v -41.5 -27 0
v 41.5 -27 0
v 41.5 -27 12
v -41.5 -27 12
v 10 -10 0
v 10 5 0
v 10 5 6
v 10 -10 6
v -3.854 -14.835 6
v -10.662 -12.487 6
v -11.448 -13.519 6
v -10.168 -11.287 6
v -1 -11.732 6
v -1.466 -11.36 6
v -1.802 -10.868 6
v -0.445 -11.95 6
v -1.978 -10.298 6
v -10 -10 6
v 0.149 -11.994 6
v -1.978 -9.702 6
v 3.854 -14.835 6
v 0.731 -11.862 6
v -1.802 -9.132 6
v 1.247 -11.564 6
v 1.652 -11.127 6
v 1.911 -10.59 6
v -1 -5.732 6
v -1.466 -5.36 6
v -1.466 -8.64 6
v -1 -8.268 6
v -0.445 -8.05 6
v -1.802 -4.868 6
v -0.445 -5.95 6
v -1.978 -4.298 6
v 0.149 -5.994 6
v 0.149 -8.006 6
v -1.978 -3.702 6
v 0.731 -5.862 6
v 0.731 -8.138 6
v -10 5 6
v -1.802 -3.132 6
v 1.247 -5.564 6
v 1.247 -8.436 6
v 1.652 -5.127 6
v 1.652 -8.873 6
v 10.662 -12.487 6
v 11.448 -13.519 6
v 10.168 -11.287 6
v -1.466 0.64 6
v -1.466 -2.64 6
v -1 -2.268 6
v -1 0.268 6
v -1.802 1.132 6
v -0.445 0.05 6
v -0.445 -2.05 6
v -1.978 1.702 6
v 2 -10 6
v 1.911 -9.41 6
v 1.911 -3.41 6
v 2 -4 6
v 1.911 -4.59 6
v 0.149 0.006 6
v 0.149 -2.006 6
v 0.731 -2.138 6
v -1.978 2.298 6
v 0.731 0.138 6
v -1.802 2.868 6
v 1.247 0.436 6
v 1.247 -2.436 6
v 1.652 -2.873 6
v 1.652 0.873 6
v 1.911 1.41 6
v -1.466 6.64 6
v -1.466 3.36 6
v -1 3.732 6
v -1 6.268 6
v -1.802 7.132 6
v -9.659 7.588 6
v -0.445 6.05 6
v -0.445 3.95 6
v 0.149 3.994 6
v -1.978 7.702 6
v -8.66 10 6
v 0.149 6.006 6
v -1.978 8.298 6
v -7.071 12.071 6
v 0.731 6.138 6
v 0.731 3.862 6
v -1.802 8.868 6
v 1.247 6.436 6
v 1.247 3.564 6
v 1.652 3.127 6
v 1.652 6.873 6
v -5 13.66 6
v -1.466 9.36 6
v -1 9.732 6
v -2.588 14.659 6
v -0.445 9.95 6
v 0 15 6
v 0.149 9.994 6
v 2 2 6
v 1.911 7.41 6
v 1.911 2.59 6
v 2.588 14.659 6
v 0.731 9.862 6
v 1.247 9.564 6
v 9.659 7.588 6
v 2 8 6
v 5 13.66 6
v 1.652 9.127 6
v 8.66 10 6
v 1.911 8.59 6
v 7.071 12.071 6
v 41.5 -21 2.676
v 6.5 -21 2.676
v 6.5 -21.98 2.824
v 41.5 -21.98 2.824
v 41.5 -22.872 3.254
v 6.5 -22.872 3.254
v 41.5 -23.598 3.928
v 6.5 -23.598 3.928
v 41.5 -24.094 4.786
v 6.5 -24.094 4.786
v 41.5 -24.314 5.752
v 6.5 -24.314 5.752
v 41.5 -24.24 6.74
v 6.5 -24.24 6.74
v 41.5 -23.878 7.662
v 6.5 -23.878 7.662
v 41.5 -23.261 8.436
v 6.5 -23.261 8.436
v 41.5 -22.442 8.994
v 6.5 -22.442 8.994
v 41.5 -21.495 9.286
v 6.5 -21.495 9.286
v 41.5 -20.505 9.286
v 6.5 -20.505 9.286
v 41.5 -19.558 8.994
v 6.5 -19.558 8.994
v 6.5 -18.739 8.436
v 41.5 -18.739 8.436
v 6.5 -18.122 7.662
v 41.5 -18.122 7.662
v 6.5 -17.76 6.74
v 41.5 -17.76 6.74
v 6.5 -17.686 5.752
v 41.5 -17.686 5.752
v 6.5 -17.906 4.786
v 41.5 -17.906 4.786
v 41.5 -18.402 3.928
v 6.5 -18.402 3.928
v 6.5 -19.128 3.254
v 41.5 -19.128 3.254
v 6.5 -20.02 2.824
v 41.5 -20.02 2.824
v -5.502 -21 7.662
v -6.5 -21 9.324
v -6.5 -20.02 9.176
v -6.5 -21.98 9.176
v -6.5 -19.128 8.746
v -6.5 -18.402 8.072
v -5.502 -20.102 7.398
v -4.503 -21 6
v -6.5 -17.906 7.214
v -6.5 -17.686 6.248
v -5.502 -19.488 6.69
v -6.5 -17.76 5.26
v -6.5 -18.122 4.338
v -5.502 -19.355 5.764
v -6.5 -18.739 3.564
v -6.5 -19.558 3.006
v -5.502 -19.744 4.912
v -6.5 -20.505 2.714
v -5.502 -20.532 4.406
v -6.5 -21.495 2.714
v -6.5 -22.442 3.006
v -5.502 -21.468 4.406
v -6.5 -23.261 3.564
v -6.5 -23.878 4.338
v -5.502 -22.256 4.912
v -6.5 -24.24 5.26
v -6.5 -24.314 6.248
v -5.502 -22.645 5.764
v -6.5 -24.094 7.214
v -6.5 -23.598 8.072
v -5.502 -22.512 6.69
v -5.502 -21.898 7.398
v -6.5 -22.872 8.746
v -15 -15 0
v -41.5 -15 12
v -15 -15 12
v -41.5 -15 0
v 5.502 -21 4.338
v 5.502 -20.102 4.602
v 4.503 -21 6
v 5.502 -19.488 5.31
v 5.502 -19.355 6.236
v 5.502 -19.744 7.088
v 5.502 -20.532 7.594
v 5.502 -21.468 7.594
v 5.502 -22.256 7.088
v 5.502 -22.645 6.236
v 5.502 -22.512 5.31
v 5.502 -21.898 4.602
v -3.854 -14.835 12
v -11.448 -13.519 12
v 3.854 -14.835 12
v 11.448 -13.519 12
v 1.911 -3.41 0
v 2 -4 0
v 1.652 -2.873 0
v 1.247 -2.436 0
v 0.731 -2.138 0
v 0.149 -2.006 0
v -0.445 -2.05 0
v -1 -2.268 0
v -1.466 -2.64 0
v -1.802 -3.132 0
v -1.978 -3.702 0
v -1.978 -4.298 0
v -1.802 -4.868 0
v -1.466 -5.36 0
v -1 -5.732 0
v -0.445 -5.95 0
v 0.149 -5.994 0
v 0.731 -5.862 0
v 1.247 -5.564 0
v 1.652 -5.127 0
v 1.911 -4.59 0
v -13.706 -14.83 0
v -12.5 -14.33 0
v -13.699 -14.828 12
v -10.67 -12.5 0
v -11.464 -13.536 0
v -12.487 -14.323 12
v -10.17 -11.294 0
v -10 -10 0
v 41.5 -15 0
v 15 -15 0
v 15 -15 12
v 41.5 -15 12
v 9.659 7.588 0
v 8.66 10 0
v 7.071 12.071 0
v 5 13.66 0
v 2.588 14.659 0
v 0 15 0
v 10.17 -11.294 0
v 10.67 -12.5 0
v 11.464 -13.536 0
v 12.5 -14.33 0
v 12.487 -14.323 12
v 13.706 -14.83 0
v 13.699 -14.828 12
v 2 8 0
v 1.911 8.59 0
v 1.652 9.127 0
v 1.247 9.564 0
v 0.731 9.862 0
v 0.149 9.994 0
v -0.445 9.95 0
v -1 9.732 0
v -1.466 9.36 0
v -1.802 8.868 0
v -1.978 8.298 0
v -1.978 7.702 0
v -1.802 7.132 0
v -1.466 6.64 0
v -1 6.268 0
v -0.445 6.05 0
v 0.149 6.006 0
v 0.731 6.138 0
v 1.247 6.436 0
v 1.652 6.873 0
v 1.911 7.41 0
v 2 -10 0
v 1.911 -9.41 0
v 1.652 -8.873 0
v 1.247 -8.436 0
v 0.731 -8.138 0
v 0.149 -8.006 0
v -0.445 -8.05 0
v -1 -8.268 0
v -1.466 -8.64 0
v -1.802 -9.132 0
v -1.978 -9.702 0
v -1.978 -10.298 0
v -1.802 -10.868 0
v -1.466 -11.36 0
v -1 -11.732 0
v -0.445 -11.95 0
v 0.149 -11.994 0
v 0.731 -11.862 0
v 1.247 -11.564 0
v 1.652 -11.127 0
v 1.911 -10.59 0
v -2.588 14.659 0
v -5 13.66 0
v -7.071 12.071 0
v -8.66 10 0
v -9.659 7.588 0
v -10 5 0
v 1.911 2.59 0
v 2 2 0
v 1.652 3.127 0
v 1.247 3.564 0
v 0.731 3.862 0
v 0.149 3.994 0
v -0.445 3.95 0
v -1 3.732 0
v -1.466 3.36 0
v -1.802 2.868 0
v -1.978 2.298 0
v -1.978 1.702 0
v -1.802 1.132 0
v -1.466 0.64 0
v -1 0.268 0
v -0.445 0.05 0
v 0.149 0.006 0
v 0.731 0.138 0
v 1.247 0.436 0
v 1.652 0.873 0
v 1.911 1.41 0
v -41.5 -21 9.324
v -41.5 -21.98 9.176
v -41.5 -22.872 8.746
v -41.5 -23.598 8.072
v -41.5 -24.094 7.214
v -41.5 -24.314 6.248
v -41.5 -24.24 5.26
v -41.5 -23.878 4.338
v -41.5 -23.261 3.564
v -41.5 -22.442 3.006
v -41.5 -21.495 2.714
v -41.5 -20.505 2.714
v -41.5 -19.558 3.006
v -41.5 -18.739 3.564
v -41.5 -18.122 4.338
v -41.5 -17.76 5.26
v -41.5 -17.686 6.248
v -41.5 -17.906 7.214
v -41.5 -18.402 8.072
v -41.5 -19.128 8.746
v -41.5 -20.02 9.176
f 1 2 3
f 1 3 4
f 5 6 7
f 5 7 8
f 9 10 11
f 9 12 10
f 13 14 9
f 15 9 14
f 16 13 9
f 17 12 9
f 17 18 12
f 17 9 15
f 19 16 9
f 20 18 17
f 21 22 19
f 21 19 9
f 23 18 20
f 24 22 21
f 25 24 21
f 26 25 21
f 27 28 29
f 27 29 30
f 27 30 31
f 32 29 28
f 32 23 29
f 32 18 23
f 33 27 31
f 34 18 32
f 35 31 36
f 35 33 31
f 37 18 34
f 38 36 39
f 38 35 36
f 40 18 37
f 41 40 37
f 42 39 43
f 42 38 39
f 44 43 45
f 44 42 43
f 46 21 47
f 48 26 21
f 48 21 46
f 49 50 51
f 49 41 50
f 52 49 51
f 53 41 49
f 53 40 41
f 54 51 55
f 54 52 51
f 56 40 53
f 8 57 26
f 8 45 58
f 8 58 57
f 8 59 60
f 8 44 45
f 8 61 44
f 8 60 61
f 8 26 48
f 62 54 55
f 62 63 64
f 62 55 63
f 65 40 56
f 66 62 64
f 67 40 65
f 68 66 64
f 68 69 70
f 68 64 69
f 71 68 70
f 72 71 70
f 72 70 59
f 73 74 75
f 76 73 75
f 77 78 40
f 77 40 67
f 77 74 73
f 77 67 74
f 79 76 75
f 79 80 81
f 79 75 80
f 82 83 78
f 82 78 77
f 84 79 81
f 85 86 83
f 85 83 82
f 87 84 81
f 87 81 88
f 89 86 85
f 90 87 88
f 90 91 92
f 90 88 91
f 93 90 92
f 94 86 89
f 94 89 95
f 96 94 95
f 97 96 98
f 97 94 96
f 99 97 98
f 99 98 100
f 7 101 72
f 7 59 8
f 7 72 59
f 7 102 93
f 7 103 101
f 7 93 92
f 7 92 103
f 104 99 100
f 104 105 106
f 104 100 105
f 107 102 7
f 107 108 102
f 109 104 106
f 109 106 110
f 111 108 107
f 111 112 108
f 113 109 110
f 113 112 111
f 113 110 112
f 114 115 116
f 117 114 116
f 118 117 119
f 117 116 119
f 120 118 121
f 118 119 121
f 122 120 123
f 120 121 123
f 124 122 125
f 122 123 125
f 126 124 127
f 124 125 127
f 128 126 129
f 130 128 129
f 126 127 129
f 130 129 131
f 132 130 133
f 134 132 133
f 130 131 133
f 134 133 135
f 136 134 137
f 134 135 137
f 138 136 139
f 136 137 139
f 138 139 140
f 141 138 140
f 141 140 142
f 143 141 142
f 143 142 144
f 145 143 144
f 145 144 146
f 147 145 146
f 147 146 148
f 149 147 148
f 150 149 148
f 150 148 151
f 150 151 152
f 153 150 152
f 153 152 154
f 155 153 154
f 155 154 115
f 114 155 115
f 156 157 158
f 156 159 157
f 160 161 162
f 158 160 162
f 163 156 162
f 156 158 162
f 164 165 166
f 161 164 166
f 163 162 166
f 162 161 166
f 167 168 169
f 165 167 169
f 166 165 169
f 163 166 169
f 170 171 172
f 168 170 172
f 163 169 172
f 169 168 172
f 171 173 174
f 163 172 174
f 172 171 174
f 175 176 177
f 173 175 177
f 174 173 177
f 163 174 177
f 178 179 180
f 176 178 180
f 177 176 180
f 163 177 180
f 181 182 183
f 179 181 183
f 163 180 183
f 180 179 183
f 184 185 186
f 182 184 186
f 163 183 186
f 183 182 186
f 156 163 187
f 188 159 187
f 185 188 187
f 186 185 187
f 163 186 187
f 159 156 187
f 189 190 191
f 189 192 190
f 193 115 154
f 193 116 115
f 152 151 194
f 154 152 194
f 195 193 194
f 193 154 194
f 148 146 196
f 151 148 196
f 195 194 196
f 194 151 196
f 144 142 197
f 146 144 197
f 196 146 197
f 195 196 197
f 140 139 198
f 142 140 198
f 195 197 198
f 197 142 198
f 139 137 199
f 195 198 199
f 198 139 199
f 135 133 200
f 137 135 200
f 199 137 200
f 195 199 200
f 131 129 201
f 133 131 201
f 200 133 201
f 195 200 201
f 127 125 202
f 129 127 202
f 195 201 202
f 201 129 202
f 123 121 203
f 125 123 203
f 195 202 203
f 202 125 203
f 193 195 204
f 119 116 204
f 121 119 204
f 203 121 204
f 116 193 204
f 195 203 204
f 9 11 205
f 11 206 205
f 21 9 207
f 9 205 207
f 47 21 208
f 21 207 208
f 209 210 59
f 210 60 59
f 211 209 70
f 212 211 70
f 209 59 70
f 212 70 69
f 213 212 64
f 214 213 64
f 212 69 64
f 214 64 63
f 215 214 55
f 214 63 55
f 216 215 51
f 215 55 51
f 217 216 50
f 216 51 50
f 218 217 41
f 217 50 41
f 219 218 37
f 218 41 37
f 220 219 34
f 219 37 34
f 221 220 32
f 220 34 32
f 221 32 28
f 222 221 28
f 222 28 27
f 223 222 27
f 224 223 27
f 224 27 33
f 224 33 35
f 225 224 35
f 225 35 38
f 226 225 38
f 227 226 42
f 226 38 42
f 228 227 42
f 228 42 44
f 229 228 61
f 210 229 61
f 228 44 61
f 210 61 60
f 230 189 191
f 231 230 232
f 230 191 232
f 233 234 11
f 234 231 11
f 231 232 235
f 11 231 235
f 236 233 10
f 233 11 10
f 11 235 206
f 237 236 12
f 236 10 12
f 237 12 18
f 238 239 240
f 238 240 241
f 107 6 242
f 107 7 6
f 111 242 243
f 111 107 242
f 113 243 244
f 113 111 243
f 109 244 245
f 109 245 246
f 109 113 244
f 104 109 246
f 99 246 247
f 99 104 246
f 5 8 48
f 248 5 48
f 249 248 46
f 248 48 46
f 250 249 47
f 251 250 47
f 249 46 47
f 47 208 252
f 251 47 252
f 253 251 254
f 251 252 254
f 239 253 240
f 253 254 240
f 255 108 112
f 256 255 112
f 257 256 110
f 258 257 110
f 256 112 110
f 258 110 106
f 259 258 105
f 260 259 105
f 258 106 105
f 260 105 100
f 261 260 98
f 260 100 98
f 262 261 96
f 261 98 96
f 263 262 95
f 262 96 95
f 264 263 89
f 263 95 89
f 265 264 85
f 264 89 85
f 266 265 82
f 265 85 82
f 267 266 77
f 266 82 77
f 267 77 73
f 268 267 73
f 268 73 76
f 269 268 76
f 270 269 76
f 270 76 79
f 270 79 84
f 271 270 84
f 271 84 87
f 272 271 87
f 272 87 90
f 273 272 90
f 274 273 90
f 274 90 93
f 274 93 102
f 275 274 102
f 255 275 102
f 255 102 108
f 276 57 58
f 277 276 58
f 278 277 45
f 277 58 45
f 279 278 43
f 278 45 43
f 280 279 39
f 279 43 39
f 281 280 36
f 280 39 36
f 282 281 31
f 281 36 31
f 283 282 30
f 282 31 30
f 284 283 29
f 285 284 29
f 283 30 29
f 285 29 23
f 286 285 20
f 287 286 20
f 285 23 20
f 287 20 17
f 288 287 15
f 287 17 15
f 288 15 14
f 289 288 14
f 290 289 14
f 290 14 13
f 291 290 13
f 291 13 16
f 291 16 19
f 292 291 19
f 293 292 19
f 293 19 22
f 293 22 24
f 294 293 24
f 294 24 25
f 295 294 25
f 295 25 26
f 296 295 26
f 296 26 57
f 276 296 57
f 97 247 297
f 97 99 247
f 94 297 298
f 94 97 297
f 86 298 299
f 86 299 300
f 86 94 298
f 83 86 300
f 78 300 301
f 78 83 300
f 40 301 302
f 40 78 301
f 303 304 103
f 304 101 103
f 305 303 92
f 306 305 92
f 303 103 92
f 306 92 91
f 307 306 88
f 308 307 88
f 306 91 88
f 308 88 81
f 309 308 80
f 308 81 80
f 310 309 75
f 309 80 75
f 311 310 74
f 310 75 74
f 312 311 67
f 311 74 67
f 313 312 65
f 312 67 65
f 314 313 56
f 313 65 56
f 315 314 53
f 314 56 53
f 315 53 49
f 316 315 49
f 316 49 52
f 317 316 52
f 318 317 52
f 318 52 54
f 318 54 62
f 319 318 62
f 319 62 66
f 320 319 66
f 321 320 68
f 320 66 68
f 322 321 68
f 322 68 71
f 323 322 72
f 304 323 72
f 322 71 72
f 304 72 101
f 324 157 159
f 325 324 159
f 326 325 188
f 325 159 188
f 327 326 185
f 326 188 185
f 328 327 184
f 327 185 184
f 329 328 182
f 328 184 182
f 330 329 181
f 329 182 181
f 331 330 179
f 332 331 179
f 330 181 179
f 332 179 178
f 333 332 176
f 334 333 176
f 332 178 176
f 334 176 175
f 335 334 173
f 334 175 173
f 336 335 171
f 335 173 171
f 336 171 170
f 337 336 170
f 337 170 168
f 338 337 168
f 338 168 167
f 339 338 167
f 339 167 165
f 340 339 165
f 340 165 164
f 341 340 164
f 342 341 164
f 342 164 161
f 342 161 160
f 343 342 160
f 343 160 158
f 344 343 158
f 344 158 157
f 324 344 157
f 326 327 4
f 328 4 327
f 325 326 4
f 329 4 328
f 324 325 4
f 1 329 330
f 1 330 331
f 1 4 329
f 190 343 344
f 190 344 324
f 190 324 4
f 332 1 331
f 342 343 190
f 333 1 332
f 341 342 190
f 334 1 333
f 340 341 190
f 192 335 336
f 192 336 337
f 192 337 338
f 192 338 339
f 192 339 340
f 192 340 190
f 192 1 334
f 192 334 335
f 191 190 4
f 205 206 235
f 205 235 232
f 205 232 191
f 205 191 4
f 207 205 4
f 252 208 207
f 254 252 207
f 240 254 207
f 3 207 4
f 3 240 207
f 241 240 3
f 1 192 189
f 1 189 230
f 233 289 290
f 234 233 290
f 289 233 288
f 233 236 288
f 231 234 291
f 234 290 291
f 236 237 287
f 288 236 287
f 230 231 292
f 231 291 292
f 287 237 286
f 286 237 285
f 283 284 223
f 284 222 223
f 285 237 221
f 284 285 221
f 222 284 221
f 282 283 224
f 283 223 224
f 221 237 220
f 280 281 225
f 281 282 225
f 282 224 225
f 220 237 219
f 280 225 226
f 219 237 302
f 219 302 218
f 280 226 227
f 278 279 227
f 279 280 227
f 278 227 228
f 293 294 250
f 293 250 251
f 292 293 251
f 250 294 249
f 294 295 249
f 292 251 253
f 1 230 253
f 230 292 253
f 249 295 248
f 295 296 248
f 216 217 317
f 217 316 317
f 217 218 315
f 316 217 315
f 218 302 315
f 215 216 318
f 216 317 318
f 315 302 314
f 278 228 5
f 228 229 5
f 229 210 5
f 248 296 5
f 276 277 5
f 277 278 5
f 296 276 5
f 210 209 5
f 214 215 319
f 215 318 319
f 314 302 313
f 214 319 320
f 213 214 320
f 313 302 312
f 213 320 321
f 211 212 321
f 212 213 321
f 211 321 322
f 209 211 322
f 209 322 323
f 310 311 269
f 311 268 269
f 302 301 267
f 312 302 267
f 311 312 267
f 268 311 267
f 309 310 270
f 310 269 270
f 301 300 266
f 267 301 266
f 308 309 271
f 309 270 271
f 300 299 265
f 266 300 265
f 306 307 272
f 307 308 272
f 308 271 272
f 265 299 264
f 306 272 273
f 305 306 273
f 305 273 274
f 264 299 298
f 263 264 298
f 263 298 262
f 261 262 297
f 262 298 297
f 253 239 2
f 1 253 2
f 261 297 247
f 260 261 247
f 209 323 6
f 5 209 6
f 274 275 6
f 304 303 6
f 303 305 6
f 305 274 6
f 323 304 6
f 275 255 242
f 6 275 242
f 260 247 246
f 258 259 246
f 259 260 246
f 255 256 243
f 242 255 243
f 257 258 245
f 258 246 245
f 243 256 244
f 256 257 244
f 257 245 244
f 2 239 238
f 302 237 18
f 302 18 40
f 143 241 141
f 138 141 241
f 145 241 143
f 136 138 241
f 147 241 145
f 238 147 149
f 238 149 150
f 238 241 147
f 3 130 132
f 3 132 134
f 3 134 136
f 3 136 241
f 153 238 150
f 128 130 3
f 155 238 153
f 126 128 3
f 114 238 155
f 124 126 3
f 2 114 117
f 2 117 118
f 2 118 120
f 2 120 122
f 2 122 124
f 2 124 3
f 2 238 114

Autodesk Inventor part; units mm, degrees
ref_plane "YZ Plane" through (0, 0, 0) normal (1, 0, 0) x (0, 1, 0)
ref_plane "XZ Plane" through (0, 0, 0) normal (0, 1, 0) x (-1, 0, 0)
ref_plane "XY Plane" through (0, 0, 0) normal (0, 0, 1) x (1, 0, 0)
sketch "Sketch1" plane through (0, 0, 0) normal (0, 0, 1) x (1, 0, 0)
  line L0 (0, 23.4) -> (0, -35.4) projected
  line L1 (-58.1, 0) -> (58.1, 0) projected
  line L2 (-10, 15) -> (10, 15)
  line L3 (10, 15) -> (10, -15)
  line L4 (10, -15) -> (-10, -15)
  line L5 (-10, -15) -> (-10, 15)
  line L6 (-41.5, -15) -> (41.5, -15)
  line L7 (41.5, -15) -> (41.5, -27)
  line L8 (41.5, -27) -> (-41.5, -27)
  line L9 (-41.5, -27) -> (-41.5, -15)
  point P0 (0, 0)
  point P1 (10, -15)
  point P2 (-10, -15)
  dimension "d0" = 30
  dimension "d1" = 12
  dimension "d2" = 83
  dimension "d3" = 20
extrude "Extrusion1" add sketch "Sketch1" along normal blind 12
sketch "Sketch2" plane through (41.5, -27, 0) normal (1, 0, 0) x (0, 0, -1)
  line L0 (0, 12) -> (-12, 12) projected
  line L1 (-12, 0) -> (-12, 12) projected
  point P0 (0, 27)
  point P1 (-6, 6)
  dimension "d6" = 6
  dimension "d7" = 6
hole "Hole1" at (41.5, -21, 6) direction (-1, 0, 0) diameter 6.647 depth 35 tip angle 118 thread size "M8x1.25" class "6H" standard "ISO Metric profile"
sketch "Sketch3" plane through (-41.5, -27, 0) normal (-1, 0, 0) x (0, 0, 1)
  line L0 (0, 12) -> (12, 12) projected
  line L1 (0, 12) -> (0, 0) projected
  point P0 (0, 27)
  point P1 (6, 6)
  dimension "d15" = 6
  dimension "d16" = 6
hole "Hole2" at (-41.5, -21, 6) direction (1, 0, 0) diameter 6.647 depth 35 tip angle 118 thread size "M8x1.25" class "6H" standard "ISO Metric profile"
sketch "Sketch4" plane through (0, 0, 12) normal (0, 0, 1) x (1, 0, 0)
  line L0 (-10, 15) -> (-10, -15) projected
  line L1 (-10, -15) -> (-41.5, -15) projected
  line L2 (-41.5, -15) -> (-41.5, -27) projected
  line L3 (-41.5, -27) -> (41.5, -27) projected
  line L4 (41.5, -27) -> (41.5, -15) projected
  line L5 (41.5, -15) -> (10, -15) projected
  line L6 (10, -15) -> (10, 15) projected
  circle A0 centre (0, -10) radius 2
  line L7 (10, 15) -> (-10, 15) projected
  circle A1 centre (0, -4) radius 2
  circle A2 centre (0, 2) radius 2
  circle A3 centre (0, 8) radius 2
  point P0 (0, 0)
  dimension "d26" = 4
  dimension "d50" = 17
  dimension "d51" = 10
  dimension "d52" = 4
  dimension "d53" = 6
  dimension "d54" = 4
  dimension "d55" = 10
  dimension "d56" = 6
  dimension "d57" = 10
  dimension "d58" = 4
  dimension "d59" = 10
  dimension "d60" = 6
extrude "Extrusion2" cut sketch "Sketch4" against normal through all contours A0 | A1 | A2 | A3
fillet "Fillet2" radius 5 2 edges at (10, -15, 6) (-10, -15, 6)
sketch "Sketch5" plane through (0, 0, 12) normal (0, 0, 1) x (1, 0, 0)
  line L0 (-10, 15) -> (-10, -10) projected
  arc A0 (-15, -15) -> (-10, -10) centre (-15, -10) ccw projected
  line L1 (-15, -15) -> (-41.5, -15) projected
  line L2 (-41.5, -15) -> (-41.5, -27) projected
  line L3 (-41.5, -27) -> (41.5, -27) projected
  line L4 (41.5, -27) -> (41.5, -15) projected
  line L5 (41.5, -15) -> (15, -15) projected
  arc A1 (10, -10) -> (15, -15) centre (15, -10) ccw projected
  line L6 (10, -10) -> (10, 15) projected
  circle A2 centre (0, -10) radius 2 projected
  line L7 (-54.6159, 30) -> (65.6495, 30)
  line L8 (0, 98.4) -> (0, -47.9) projected
  circle A3 centre (0, 30) radius 45
  line L9 (10, 15) -> (-10, 15) projected
  circle A4 centre (0, 8) radius 2 projected
  point P0 (0, 0)
  point P1 (-11.4484, -13.5194)
  point P2 (11.4484, -13.5194)
  point P3 (10.181, -11.3332)
  point P4 (-10.181, -11.3332)
  dimension "d42" = 57
  dimension "d43" = 90
extrude "Extrusion3" cut sketch "Sketch5" against normal blind 6 contours L9 L8 A4 A2 A3 A0 L0 | L0 A0 A3 L7 L8 L9 | L9 L6 A1 A3 L8 A2 A4 | L8 L7 A3 A1 L6 L9 | L8 A3 L7 | L7 A3 L8 | A4 L8 | L8 A4
fillet "Fillet4" radius 10 2 edges at (10, 15, 3) (-10, 15, 3)
properties part number "workTrianglePc1"
